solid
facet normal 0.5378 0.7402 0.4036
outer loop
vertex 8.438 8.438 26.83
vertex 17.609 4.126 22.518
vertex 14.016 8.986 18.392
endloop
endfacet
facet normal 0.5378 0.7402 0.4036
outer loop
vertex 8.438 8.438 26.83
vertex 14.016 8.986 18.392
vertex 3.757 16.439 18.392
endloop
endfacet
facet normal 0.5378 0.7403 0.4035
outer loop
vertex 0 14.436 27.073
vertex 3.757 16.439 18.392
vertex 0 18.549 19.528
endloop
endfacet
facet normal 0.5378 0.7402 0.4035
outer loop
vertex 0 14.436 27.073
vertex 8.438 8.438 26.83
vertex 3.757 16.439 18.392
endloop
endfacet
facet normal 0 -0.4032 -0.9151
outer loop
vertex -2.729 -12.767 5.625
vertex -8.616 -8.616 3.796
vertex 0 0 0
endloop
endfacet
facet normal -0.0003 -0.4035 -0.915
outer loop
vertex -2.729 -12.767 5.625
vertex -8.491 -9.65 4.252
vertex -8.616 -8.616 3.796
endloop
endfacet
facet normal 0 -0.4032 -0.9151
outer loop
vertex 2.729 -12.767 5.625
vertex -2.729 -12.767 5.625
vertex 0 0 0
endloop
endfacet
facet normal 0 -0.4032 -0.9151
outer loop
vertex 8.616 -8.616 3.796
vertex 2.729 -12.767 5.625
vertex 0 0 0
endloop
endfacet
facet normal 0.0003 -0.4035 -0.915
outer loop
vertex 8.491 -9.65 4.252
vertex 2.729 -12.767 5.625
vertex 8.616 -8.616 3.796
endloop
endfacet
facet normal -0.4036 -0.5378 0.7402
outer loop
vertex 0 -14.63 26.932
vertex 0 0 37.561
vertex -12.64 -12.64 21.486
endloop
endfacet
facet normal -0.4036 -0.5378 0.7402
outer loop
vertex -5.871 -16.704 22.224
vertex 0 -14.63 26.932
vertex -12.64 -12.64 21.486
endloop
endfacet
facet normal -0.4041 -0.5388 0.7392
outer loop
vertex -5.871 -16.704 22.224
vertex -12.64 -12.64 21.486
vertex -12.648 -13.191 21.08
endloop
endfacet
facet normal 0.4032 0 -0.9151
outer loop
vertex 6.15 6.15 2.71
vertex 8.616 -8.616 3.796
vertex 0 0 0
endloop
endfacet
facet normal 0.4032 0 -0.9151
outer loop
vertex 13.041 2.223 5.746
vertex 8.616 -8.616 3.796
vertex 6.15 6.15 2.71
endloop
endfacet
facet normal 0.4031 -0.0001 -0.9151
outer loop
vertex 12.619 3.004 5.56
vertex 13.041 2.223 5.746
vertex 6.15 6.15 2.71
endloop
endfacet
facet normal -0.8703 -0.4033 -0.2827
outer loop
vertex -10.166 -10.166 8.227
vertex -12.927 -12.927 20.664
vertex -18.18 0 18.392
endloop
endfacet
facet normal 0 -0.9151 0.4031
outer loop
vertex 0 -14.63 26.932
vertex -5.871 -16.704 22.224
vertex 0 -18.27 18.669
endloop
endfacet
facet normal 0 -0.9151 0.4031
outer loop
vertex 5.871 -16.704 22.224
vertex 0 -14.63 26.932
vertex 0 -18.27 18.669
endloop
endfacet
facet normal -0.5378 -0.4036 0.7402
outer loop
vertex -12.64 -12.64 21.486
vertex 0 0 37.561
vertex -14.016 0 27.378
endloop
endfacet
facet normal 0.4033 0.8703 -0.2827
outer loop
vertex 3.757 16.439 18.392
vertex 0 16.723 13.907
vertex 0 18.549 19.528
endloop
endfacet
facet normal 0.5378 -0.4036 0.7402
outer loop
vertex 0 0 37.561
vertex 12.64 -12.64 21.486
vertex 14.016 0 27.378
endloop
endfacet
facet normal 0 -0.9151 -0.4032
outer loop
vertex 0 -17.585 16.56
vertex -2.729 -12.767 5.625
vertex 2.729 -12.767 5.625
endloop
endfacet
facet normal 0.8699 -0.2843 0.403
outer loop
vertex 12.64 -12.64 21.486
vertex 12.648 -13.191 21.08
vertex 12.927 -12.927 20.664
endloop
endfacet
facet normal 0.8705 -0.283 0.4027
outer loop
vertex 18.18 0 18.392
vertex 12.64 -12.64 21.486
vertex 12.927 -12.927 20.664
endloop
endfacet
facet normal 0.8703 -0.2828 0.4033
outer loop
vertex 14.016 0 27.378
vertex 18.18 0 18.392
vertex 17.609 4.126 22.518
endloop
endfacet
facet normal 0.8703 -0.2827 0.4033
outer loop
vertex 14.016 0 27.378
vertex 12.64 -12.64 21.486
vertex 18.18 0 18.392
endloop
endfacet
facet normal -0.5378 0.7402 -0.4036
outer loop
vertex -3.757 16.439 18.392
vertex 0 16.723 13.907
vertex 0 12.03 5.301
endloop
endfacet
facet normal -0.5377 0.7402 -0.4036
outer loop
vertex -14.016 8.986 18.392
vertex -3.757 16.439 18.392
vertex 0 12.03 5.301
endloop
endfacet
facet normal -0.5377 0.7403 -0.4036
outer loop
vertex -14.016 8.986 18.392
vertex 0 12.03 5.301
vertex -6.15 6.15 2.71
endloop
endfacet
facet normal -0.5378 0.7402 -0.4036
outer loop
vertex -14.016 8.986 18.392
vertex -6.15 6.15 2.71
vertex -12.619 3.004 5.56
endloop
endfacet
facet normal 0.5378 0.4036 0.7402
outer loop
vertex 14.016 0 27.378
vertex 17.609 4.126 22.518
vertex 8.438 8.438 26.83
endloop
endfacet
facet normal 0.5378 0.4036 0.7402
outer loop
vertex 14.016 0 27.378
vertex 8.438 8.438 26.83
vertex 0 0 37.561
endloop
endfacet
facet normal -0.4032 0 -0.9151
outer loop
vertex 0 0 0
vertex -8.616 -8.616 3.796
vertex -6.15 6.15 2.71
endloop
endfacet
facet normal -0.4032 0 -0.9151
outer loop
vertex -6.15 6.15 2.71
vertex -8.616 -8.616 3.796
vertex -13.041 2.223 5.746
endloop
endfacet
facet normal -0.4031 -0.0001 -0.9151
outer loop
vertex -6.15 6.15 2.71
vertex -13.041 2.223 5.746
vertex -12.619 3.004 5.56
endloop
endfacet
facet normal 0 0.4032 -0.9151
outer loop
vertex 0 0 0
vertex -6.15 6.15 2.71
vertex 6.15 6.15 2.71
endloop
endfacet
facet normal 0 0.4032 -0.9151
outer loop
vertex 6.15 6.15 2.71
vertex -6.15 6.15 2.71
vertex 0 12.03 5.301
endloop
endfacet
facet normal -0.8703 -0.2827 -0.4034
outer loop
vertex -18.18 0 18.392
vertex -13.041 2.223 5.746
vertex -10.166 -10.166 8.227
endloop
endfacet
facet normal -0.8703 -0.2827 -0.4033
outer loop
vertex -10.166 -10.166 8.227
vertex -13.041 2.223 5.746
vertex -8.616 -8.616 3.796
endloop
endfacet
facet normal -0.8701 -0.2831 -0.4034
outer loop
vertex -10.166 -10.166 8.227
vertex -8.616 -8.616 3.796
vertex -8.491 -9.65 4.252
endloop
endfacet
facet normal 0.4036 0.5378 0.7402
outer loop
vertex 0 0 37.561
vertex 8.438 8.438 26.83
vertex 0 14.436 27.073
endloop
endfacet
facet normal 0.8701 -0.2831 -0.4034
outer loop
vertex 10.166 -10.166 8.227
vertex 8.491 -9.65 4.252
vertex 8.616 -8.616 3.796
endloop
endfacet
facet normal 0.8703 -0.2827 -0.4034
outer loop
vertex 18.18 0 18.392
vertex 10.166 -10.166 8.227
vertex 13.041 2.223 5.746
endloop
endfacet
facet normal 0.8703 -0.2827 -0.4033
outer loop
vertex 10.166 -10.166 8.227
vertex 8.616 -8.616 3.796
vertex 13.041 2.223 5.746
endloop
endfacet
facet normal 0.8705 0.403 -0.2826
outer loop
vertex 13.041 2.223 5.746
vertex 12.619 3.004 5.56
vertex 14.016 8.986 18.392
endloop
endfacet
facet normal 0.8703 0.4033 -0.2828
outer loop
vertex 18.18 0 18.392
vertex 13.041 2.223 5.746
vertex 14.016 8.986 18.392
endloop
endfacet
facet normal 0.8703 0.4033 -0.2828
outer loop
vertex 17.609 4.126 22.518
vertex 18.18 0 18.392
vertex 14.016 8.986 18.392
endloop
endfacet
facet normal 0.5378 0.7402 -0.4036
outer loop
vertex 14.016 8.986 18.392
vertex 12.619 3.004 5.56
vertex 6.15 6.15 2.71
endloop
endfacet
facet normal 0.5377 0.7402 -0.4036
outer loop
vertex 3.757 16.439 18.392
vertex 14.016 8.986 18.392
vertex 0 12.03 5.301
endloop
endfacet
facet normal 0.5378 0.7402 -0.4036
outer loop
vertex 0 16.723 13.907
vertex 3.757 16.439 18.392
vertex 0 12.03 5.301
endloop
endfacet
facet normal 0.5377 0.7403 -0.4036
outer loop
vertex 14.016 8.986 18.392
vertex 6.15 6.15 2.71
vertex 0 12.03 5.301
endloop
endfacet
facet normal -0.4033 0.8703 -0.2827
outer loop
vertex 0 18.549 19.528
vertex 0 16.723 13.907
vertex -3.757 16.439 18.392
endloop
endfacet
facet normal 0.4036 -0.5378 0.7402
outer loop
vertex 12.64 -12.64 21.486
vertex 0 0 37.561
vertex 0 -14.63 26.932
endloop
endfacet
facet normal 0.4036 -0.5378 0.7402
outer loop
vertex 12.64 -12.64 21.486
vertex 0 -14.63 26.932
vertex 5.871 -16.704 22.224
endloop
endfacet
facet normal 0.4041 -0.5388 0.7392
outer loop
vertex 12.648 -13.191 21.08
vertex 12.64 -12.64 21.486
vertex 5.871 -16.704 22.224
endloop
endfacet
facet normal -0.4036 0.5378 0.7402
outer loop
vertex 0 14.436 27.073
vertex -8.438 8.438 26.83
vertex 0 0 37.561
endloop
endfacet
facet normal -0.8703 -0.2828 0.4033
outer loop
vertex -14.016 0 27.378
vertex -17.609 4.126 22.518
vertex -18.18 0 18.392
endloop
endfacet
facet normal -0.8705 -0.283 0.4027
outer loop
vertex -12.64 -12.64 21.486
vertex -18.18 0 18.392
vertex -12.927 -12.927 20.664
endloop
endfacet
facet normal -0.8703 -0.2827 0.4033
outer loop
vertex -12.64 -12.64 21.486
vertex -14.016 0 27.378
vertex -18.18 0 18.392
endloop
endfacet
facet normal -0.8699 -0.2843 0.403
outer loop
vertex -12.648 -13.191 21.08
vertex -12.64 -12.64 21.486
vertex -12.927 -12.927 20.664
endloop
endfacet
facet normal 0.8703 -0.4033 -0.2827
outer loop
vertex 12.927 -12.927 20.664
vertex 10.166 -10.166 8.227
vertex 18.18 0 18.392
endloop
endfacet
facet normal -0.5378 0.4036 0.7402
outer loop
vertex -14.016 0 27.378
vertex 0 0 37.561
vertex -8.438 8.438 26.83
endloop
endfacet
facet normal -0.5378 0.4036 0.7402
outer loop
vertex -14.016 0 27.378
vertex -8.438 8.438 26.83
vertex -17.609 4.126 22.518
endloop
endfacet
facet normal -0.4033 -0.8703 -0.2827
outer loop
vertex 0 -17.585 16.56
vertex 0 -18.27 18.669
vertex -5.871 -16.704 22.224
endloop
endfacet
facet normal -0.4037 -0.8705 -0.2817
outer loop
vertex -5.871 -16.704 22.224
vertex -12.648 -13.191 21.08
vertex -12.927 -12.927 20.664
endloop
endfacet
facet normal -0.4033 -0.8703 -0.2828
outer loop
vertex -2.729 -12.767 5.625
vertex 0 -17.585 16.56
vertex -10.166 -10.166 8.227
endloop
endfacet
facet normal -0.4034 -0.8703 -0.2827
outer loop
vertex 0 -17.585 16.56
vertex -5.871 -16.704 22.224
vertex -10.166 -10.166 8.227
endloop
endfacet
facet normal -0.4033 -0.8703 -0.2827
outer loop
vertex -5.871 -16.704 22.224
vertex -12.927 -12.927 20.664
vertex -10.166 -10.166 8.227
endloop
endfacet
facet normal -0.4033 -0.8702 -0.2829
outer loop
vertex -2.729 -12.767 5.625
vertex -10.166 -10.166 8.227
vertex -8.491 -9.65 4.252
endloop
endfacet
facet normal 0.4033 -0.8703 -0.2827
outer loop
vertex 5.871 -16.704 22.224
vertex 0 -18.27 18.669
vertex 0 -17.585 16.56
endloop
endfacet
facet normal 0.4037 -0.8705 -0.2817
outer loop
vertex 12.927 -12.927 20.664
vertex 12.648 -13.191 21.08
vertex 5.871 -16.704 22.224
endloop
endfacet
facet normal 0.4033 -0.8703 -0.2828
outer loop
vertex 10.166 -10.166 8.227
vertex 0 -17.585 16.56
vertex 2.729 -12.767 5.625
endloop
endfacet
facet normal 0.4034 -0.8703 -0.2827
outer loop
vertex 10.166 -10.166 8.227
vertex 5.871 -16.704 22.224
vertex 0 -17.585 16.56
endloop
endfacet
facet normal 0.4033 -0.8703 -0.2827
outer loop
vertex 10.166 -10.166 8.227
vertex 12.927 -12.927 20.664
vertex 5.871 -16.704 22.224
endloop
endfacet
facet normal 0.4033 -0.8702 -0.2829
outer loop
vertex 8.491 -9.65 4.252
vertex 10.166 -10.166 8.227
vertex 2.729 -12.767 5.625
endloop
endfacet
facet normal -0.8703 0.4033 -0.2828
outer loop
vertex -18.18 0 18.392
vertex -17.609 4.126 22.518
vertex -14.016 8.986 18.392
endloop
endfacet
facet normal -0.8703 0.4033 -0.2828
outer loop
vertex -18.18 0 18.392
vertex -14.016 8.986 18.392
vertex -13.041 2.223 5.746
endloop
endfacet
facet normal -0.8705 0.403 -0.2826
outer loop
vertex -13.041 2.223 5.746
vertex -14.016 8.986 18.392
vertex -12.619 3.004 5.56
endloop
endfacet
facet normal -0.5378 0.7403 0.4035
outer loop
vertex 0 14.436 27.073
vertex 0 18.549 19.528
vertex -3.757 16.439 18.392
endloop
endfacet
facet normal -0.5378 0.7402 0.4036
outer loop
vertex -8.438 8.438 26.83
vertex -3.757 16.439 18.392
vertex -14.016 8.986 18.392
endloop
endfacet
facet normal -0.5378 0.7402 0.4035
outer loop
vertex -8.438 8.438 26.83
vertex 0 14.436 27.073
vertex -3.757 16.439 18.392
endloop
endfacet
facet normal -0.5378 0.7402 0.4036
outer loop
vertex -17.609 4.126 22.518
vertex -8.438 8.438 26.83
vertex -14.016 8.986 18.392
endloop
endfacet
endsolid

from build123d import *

# Parameters (mm, degrees)
F5_COUNT = 4
F6_COUNT = 2
F6_ANGLE = 90


with BuildPart() as f2:
    # F0 (on Front) → F2 section 0
    with BuildSketch(Plane.XZ, mode=Mode.PRIVATE) as f2_s0:
        Polygon((-12.204321, 0), (12.204321, 0), (19.747007, 23.213998), (0, 37.561038), (-19.747007, 23.213998), align=None)
    loft([f2_s0.sketch, Vertex(0, 38.1, 16.787151)])

    # F4: F2 across plane


with BuildPart() as f2_1:
    add(f2.part)
    add(f2.part.mirror(Plane.XZ))


with BuildPart() as f5_1:
    # F5: instance of F2
    add(f2_1.part.rotate(Axis((0, 0, 18.392423), (0, 0, 1)), 1 * 360 / F5_COUNT))


with BuildPart() as f5_2:
    # F5: instance of F2
    add(f2_1.part.rotate(Axis((0, 0, 18.392423), (0, 0, 1)), 2 * 360 / F5_COUNT))


with BuildPart() as f5_3:
    # F5: instance of F2
    add(f2_1.part.rotate(Axis((0, 0, 18.392423), (0, 0, 1)), 3 * 360 / F5_COUNT))


with BuildPart() as f6_1:
    # F6: instance of F2
    add(f2_1.part.rotate(Axis((0.121067, 0, 18.392423), (-1, 0, 0)), 1 * F6_ANGLE / (F6_COUNT - 1)))


with BuildPart() as f2_2:
    add(f2_1.part)

    # F7: intersect F5_1, F6_1, F5_2, F5_3
    add(f5_1.part, mode=Mode.INTERSECT)
    add(f6_1.part, mode=Mode.INTERSECT)
    add(f5_2.part, mode=Mode.INTERSECT)
    add(f5_3.part, mode=Mode.INTERSECT)


solid = f2_2.part
